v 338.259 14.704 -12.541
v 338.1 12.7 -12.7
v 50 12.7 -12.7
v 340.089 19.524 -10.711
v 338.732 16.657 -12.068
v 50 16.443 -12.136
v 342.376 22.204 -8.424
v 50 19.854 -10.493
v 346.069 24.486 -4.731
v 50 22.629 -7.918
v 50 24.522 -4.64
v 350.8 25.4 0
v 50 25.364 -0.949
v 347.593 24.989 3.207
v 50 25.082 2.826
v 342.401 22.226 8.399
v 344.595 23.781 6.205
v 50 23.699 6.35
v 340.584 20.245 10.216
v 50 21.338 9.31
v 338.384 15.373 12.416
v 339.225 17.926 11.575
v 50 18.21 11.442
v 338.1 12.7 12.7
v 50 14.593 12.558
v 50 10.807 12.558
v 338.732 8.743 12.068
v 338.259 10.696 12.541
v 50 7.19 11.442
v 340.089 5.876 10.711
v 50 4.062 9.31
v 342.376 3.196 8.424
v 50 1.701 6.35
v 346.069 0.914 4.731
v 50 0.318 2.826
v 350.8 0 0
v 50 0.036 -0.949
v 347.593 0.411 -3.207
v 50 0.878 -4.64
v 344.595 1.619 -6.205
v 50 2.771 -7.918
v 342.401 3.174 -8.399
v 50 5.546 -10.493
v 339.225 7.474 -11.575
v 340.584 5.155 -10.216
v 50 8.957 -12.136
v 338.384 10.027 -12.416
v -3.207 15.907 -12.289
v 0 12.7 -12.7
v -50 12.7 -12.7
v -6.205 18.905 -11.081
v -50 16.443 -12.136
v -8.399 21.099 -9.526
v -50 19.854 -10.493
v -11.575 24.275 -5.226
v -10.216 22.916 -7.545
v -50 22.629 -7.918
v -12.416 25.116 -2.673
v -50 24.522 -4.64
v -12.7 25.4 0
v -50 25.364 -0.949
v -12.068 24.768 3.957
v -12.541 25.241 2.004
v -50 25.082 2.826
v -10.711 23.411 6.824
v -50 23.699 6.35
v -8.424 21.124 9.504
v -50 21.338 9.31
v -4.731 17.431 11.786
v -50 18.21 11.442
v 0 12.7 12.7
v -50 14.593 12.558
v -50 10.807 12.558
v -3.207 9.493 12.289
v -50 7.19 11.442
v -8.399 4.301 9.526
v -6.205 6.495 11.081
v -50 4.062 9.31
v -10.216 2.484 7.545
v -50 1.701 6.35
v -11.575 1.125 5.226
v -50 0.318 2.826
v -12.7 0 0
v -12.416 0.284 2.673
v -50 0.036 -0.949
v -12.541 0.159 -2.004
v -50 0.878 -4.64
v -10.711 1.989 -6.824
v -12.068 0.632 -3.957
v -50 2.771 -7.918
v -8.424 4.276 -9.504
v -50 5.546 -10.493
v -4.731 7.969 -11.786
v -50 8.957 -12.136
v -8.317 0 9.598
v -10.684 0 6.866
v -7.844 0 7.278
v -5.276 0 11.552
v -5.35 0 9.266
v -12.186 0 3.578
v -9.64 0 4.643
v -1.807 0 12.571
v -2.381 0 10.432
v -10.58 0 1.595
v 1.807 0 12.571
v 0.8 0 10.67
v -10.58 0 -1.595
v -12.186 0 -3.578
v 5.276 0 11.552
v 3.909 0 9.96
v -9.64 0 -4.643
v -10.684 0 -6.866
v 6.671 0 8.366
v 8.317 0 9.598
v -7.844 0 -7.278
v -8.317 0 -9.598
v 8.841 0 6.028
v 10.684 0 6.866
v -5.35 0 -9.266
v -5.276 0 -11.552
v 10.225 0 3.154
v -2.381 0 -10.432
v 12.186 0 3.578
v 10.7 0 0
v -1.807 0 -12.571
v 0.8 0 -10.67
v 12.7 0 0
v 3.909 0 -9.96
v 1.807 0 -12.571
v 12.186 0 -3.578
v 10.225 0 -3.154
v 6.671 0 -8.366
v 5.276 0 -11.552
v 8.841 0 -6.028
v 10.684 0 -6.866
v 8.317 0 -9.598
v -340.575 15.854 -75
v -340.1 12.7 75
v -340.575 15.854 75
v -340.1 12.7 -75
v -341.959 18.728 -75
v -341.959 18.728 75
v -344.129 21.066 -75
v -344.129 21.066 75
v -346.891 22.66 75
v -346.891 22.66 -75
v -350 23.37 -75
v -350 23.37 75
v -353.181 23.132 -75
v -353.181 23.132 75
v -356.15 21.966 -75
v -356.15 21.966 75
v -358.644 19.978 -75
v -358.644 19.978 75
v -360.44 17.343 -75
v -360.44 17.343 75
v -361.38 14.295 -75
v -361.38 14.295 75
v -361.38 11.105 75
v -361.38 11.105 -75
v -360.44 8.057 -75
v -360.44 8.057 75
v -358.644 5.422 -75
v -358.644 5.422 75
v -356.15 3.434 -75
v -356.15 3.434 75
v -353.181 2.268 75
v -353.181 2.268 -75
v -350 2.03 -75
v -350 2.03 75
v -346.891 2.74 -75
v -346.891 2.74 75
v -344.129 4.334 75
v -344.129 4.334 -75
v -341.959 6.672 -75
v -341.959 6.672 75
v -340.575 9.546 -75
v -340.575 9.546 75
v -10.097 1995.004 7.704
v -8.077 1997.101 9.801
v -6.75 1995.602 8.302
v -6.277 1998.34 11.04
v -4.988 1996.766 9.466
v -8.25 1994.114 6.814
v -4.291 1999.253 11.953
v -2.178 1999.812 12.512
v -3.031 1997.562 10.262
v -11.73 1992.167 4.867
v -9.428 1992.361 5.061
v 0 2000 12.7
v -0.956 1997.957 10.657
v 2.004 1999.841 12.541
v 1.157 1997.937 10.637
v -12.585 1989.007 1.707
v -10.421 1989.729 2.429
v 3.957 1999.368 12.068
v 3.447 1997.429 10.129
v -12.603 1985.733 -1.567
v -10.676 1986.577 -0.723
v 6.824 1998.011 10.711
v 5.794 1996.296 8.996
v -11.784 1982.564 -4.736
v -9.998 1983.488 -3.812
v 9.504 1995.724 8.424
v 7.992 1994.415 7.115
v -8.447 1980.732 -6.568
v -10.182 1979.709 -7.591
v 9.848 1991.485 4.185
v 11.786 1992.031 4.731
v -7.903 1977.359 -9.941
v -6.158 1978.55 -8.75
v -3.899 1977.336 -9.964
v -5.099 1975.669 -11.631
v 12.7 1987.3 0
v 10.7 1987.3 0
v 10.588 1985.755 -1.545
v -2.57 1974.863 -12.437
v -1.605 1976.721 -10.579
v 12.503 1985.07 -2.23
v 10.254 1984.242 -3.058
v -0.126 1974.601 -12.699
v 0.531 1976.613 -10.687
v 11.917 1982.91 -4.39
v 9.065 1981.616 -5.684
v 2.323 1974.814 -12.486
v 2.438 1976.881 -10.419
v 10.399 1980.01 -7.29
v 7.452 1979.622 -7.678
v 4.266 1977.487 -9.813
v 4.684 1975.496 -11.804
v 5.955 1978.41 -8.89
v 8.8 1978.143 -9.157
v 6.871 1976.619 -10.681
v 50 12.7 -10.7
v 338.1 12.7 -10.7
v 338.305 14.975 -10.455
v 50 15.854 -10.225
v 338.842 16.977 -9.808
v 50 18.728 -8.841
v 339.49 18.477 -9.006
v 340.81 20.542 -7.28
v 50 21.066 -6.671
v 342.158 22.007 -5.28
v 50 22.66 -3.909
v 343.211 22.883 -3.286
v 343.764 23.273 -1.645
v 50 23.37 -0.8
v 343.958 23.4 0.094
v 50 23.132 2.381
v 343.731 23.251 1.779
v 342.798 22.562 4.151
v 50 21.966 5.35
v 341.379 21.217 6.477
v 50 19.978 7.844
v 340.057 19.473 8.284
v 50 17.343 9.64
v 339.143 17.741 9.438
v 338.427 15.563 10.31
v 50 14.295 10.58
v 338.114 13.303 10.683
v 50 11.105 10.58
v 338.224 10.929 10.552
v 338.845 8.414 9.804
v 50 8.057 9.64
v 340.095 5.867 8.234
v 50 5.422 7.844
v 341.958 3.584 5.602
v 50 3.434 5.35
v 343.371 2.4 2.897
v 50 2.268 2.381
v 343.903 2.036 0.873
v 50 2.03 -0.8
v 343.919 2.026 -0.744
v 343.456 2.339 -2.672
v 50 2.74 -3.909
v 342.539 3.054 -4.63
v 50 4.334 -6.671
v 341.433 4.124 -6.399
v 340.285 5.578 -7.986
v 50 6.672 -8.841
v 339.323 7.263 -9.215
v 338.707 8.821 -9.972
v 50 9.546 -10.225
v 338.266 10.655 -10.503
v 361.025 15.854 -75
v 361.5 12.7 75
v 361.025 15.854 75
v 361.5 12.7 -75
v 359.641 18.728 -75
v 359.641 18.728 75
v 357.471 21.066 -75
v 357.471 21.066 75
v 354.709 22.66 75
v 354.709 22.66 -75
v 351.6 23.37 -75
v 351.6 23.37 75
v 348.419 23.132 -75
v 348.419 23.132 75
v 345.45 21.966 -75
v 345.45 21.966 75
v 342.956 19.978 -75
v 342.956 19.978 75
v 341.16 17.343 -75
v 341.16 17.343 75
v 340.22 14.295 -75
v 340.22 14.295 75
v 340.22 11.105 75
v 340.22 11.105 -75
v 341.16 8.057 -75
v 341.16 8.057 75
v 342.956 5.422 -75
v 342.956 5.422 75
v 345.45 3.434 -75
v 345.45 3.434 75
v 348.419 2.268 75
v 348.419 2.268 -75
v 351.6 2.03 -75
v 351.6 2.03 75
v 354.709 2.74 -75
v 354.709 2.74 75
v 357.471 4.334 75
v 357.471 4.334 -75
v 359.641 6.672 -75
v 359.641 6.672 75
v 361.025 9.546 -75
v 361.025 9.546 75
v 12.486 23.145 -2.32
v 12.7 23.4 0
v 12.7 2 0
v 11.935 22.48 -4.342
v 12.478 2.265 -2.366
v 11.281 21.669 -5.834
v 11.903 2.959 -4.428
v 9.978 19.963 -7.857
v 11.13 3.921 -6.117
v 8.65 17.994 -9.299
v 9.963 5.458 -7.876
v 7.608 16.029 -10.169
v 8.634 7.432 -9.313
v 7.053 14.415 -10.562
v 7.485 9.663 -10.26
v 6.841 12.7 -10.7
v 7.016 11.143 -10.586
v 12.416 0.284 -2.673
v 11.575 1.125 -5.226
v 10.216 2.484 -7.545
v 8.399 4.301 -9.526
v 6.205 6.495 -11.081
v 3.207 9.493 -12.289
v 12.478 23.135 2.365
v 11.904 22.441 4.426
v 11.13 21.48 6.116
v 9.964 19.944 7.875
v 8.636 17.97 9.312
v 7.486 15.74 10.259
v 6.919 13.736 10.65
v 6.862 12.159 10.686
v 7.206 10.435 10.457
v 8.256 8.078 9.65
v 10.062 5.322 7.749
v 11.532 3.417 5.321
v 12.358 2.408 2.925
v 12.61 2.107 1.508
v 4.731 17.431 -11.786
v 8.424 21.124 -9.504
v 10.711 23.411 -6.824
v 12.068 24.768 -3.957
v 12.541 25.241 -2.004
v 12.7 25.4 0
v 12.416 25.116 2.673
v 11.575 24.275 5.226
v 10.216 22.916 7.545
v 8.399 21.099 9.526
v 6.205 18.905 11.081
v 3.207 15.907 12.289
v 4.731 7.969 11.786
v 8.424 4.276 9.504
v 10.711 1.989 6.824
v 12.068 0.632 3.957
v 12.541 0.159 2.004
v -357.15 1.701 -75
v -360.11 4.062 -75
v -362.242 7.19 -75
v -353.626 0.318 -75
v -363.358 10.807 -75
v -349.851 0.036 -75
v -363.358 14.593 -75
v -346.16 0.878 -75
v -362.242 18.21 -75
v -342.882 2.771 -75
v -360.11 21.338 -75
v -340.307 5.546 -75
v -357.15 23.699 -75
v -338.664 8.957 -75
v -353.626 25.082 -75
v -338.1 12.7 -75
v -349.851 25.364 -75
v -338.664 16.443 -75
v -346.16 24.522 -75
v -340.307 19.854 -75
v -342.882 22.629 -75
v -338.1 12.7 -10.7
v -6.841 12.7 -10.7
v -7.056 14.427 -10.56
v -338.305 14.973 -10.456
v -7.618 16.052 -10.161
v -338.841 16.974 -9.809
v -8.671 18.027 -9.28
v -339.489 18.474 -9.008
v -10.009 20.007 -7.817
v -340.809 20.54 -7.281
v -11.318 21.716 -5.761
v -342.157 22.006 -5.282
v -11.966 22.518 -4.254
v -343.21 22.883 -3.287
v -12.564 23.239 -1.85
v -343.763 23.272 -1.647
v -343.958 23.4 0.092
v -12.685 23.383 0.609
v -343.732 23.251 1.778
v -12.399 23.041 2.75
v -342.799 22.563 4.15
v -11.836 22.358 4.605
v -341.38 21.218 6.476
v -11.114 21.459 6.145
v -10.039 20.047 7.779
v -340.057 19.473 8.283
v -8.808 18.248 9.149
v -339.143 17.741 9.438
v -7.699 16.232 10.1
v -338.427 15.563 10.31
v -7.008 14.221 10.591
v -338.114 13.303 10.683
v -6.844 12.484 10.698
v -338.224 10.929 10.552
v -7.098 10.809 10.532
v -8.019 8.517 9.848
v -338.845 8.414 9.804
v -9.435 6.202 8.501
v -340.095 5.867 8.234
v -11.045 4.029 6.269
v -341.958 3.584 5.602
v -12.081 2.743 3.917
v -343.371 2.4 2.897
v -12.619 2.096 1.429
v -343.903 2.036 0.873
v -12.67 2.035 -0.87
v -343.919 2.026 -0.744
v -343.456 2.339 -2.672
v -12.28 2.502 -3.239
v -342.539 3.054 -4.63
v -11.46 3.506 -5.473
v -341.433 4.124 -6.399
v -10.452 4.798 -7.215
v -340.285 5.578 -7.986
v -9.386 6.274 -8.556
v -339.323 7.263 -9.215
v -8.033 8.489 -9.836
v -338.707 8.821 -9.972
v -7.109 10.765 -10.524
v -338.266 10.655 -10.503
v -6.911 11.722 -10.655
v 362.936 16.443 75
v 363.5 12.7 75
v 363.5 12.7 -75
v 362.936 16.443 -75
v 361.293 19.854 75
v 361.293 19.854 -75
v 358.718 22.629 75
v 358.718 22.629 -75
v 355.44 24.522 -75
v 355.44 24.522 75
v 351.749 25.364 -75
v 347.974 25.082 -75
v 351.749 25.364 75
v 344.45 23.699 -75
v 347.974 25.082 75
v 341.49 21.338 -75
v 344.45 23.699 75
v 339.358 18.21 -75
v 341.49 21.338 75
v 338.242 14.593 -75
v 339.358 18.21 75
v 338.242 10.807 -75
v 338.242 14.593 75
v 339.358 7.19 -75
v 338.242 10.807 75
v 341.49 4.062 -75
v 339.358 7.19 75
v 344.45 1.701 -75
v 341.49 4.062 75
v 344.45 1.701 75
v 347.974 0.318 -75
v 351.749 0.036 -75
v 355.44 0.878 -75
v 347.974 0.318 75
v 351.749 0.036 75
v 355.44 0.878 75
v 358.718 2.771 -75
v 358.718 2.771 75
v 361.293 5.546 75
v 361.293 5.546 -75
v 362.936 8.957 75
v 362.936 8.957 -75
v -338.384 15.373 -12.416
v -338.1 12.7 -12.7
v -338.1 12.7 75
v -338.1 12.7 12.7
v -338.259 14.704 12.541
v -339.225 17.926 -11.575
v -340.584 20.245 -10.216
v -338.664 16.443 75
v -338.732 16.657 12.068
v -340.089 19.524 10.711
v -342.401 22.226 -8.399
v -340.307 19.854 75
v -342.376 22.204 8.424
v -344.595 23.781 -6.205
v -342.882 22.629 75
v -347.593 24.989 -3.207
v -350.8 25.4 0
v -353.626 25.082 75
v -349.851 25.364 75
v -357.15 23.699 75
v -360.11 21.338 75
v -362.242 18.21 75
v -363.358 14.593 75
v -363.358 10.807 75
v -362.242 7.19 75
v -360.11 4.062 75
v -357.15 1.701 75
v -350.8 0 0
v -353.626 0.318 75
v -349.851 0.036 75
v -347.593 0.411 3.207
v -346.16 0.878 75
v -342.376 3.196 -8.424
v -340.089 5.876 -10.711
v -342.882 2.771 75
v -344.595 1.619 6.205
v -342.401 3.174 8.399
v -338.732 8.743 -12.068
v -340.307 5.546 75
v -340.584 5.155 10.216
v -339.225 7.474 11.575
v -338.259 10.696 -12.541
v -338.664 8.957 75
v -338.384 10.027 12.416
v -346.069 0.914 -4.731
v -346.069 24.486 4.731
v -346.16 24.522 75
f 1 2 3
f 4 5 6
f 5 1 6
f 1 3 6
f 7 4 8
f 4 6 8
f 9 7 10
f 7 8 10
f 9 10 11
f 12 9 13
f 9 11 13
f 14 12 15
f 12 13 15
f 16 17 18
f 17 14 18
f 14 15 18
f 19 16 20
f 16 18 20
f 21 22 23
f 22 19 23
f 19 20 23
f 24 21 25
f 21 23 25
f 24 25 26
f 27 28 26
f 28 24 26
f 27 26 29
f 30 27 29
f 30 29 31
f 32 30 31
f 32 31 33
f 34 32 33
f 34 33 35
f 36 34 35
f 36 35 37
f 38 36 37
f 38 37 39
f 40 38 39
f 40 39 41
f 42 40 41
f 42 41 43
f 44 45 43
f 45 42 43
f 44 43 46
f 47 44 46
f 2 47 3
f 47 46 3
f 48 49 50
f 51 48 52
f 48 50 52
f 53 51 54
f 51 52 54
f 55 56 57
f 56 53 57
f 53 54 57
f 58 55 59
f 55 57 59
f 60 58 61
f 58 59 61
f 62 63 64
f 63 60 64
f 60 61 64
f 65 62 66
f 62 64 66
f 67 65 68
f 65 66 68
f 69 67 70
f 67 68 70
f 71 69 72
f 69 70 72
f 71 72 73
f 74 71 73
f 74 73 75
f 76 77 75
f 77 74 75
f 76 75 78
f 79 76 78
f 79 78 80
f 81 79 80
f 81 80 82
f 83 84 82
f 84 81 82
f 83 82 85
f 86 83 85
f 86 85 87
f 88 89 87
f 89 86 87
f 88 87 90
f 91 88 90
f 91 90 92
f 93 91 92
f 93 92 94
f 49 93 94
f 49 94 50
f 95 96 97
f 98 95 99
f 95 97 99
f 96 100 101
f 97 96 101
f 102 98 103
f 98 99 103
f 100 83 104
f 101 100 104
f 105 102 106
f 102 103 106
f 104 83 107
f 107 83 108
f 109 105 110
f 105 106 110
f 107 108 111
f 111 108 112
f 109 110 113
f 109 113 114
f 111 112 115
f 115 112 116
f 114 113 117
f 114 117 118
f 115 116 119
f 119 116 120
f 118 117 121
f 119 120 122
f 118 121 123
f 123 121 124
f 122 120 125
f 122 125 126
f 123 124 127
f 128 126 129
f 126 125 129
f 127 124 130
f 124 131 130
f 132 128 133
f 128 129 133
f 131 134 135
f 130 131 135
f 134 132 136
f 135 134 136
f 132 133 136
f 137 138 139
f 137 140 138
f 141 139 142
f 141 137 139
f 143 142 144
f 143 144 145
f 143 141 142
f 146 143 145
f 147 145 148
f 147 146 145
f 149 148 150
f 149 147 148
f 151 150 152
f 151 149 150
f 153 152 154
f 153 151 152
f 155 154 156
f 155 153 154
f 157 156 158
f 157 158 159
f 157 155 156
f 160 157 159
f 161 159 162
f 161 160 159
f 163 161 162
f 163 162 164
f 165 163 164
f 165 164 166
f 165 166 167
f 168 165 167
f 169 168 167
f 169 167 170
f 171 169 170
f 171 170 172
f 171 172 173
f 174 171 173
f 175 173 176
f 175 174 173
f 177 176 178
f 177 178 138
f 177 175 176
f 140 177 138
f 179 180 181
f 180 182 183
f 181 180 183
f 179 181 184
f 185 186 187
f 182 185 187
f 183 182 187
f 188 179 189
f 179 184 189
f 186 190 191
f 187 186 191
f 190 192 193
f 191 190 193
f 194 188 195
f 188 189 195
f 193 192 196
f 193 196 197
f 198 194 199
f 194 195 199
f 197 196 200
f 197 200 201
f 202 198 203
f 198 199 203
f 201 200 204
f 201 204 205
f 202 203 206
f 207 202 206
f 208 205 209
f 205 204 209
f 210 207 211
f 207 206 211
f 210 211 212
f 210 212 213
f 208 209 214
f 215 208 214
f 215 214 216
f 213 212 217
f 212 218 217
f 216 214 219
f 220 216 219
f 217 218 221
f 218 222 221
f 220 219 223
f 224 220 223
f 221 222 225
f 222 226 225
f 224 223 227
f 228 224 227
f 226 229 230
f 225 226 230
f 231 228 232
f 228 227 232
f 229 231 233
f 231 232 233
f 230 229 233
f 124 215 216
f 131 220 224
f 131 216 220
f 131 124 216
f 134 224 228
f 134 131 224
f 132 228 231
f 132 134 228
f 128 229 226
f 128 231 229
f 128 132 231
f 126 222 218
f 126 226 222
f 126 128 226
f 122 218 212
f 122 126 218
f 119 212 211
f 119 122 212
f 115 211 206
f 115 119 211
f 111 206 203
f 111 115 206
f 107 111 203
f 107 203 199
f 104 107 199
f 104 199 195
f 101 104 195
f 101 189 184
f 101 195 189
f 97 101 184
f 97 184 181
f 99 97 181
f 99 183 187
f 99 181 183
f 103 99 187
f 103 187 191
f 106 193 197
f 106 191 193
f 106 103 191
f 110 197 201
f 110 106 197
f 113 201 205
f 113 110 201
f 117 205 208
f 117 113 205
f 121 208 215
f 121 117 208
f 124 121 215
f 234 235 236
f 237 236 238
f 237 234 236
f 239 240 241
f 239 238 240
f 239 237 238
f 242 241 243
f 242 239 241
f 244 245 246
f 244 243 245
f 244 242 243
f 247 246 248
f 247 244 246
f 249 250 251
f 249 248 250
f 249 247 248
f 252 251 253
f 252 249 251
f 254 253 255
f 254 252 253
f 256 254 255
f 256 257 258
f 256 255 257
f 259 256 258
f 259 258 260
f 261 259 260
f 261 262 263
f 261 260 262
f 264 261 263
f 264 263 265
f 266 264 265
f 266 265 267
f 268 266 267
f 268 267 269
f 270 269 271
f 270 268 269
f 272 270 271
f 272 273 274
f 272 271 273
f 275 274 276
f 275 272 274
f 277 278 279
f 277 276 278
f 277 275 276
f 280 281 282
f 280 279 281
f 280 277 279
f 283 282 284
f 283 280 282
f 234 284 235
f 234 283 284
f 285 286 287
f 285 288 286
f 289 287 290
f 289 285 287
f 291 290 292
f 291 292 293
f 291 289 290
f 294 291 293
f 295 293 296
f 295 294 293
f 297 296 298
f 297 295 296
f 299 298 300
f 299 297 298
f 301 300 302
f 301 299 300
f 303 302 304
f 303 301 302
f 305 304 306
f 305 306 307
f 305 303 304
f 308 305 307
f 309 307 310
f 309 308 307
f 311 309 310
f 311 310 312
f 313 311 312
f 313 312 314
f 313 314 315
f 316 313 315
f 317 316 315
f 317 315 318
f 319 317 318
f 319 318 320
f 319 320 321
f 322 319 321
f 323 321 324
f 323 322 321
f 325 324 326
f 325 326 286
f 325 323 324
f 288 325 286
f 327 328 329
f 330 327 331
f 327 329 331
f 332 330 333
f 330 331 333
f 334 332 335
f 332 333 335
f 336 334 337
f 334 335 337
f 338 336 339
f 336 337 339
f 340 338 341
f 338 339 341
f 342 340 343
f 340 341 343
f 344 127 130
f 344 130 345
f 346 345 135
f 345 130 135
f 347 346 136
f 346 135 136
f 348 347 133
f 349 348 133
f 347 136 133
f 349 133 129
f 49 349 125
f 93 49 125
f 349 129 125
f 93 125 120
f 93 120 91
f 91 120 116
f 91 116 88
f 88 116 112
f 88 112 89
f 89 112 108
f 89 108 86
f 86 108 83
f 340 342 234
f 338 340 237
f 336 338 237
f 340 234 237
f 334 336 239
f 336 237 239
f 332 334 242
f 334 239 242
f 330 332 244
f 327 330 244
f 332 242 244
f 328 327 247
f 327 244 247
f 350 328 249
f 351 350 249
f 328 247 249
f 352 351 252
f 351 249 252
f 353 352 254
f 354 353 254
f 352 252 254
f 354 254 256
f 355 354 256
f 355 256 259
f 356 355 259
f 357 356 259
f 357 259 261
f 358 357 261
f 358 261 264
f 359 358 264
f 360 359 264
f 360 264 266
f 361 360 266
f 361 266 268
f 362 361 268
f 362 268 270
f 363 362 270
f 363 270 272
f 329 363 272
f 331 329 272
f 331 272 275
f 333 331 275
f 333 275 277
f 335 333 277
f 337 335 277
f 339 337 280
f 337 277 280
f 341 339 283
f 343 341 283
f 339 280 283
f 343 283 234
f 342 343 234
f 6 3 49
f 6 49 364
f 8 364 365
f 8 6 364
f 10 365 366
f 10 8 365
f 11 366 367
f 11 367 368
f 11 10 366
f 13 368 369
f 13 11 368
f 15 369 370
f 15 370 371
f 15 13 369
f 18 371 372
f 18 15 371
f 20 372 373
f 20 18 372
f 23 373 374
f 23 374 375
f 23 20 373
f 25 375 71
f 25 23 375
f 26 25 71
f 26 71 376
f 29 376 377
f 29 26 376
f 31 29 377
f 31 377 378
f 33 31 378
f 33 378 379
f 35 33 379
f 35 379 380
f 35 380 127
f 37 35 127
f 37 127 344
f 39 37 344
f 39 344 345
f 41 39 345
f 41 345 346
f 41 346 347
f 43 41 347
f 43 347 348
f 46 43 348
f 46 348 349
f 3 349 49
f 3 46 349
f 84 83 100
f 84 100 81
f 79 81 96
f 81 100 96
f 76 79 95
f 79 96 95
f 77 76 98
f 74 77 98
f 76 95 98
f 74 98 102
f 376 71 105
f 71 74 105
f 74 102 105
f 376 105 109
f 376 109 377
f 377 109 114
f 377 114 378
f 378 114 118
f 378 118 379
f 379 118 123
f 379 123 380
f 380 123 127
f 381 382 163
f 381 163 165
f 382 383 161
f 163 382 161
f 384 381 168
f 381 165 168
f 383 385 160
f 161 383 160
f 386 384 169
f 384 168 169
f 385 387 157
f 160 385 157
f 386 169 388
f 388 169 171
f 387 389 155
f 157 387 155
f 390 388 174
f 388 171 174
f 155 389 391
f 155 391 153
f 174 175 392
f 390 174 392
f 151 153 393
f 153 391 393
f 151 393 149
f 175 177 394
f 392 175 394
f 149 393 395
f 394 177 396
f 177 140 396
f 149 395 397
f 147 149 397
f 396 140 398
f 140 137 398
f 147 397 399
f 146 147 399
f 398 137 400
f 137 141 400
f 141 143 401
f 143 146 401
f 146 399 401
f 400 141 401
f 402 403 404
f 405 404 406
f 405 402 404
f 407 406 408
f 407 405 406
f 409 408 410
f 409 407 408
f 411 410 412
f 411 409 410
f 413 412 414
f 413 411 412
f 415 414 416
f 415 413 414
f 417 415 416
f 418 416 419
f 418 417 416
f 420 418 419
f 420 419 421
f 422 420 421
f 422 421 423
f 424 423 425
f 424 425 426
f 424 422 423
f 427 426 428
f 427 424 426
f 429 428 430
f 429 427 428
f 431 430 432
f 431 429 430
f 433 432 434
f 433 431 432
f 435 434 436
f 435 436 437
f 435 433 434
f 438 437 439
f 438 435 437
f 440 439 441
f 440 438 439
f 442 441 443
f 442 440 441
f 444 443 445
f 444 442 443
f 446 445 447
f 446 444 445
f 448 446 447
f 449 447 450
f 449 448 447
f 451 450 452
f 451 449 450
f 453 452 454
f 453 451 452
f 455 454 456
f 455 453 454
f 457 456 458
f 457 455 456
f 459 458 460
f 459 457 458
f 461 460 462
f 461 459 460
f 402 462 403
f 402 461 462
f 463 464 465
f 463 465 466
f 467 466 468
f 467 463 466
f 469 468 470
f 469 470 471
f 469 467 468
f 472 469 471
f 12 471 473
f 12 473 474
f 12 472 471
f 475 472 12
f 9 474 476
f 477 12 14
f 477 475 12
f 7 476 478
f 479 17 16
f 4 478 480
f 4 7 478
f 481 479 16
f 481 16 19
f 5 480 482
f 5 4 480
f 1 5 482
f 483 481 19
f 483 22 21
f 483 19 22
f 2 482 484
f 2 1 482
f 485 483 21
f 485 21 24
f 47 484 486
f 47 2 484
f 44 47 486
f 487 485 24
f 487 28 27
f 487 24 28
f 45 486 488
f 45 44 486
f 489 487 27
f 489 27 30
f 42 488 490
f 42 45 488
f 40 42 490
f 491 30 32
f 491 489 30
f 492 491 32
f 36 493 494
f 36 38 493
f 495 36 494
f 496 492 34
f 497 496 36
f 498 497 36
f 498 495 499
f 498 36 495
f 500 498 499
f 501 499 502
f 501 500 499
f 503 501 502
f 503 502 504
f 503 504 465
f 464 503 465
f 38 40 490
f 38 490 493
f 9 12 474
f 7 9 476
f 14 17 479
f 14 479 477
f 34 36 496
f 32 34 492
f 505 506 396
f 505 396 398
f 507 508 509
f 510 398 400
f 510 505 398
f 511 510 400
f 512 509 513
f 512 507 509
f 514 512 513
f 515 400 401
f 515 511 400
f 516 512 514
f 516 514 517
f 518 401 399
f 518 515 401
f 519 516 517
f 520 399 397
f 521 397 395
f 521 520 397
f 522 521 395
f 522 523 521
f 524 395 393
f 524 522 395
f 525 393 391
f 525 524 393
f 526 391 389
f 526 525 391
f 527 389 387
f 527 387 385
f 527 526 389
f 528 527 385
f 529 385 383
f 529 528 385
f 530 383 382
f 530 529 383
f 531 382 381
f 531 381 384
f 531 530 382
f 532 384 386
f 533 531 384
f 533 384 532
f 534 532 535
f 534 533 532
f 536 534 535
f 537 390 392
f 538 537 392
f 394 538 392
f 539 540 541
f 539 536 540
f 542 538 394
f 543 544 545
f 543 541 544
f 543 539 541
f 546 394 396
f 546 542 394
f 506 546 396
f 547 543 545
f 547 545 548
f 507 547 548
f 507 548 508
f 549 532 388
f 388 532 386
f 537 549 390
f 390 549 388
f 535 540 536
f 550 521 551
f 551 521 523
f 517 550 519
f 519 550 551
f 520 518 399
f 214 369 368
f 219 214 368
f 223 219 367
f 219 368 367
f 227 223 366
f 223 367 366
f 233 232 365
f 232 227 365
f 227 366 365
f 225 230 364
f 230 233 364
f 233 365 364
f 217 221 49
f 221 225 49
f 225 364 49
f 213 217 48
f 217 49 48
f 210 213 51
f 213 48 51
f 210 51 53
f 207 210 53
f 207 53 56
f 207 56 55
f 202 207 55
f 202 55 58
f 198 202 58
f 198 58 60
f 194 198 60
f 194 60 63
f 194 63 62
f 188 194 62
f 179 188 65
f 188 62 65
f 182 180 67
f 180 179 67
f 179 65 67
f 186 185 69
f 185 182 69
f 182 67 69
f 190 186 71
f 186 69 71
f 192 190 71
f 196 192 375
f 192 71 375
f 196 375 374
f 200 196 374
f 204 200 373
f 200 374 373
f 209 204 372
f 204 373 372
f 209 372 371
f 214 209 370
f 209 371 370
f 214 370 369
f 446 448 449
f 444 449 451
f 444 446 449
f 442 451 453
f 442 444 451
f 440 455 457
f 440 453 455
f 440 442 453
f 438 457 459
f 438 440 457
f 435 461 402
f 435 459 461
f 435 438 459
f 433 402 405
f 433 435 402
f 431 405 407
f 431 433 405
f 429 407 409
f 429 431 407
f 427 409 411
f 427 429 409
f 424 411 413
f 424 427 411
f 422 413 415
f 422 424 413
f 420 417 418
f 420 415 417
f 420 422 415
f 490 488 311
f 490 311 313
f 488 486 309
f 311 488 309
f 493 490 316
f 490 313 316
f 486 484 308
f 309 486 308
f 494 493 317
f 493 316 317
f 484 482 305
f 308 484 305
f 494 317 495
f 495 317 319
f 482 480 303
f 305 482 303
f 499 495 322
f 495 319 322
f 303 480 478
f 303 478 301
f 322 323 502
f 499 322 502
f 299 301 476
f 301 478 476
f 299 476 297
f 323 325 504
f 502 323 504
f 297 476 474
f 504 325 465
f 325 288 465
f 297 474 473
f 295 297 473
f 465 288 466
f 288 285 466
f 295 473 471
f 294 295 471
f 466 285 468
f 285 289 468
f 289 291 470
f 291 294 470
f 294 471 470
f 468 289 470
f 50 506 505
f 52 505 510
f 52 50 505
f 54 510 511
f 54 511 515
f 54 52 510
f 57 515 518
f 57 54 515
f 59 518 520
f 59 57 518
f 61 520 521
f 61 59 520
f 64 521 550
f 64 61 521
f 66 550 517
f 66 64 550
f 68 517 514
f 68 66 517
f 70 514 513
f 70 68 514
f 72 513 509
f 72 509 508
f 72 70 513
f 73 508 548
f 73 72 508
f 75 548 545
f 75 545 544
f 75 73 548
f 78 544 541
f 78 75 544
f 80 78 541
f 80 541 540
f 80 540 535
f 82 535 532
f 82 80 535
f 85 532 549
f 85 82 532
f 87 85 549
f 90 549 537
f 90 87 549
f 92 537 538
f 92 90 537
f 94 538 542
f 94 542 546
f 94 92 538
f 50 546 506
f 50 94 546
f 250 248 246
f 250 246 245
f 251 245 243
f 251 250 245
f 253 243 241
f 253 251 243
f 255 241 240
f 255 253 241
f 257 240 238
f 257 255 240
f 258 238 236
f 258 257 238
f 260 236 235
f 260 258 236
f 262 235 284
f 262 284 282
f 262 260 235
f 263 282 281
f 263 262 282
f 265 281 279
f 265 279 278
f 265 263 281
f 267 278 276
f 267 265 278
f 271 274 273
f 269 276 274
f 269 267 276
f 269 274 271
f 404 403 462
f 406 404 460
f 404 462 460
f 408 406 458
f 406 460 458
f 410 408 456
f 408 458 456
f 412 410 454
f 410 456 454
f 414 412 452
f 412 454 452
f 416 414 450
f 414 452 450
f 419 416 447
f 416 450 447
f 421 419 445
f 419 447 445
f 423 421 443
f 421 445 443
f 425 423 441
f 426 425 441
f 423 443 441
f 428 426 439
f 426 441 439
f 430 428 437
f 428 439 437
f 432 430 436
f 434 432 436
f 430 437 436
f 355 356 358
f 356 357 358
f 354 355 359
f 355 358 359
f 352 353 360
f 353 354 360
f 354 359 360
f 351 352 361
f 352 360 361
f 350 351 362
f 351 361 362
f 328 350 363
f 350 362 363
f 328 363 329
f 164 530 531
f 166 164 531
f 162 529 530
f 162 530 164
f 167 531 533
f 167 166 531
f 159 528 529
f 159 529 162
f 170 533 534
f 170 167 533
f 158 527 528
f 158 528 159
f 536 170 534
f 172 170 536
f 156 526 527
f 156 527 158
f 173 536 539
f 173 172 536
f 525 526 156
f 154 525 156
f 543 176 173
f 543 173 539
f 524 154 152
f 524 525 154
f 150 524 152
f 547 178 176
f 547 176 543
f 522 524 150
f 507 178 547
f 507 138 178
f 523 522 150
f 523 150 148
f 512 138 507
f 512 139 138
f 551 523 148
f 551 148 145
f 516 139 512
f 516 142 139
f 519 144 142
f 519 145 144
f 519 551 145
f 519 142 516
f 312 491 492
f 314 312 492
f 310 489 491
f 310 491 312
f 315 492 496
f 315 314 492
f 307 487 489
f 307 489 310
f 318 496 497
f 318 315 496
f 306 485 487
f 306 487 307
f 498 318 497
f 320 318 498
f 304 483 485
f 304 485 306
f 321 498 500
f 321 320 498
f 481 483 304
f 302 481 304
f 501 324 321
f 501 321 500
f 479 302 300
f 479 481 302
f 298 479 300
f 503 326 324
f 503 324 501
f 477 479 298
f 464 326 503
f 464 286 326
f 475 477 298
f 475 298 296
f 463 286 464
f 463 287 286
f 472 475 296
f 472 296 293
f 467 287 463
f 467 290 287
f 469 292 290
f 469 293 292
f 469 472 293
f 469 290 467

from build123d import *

# Parameters (mm, degrees)
SKETCH1_R                            = 12.7
SKETCH1_R_2                          = 10.7
EXTRUDE_THIN1_DEPTH                  = 2000
SKETCH6_R                            = 12.7
SKETCH6_R_2                          = 10.7
EXTRUDE_THIN4_DEPTH                  = 75
EXTRUDE_THIN5_REACH                  = 2086.148
EXTRUDE_THIN5_END_RADIUS             = 12.7
EXTRUDE_THIN5_START                  = 50
SKETCH7_R                            = 12.7
SKETCH7_R_2                          = 10.7
EXTRUDE_THIN5_DIRECTION_2_REACH      = 2086.148
EXTRUDE_THIN5_DIRECTION_2_END_RADIUS = 12.7
SKETCH8_R                            = 12.7
SKETCH8_R_2                          = 10.7
EXTRUDE_THIN6_DEPTH                  = 75
EXTRUDE_THIN8_REACH                  = 2086.148
EXTRUDE_THIN8_END_RADIUS             = 12.7
EXTRUDE_THIN8_START                  = -50
SKETCH9_R                            = 12.7
SKETCH9_R_2                          = 10.7
EXTRUDE_THIN8_DIRECTION_2_REACH      = 2086.148
EXTRUDE_THIN8_DIRECTION_2_END_RADIUS = 12.7


with BuildPart() as part:
    # Sketch1 → Extrude-Thin1 (new body)
    with BuildSketch(Plane(origin=(0, 0, 0), x_dir=(1, 0, 0), z_dir=(0, 1, 0))):
        Circle(SKETCH1_R)
        Circle(SKETCH1_R_2, mode=Mode.SUBTRACT)
    extrude(amount=EXTRUDE_THIN1_DEPTH)



with BuildPart() as body_2:
    # Sketch6 → Extrude-Thin4 (new, symmetric)
    with BuildSketch(Plane.XY):
        with Locations((350.8, 12.7)):
            Circle(SKETCH6_R)
        with Locations((350.8, 12.7)):
            Circle(SKETCH6_R_2, mode=Mode.SUBTRACT)
    extrude(amount=EXTRUDE_THIN4_DEPTH, both=True)


with BuildPart() as part_1:
    add(part.part)

    add(body_2.part)  # Extrude-Thin5 merges body 2
    # Extrude-Thin5: up to this cylinder (the profile starts outside it)
    extrude_thin5_end = Plane(origin=(350.8, 12.7, 12.34079), z_dir=(0, 0, -1)) * Cylinder(EXTRUDE_THIN5_END_RADIUS, 4198.696, mode=Mode.PRIVATE)
    # Sketch7 → Extrude-Thin5 (add, up to the surface)
    with BuildSketch(Plane(origin=(0, 0, 0), x_dir=(0, 0, -1), z_dir=(1, 0, 0)).offset(EXTRUDE_THIN5_START), mode=Mode.PRIVATE) as extrude_thin5_sk1:
        with Locations((0, 12.7)):
            Circle(SKETCH7_R)
        with Locations((0, 12.7)):
            Circle(SKETCH7_R_2, mode=Mode.SUBTRACT)
    extrude_thin5_tool1 = extrude(extrude_thin5_sk1.sketch, amount=EXTRUDE_THIN5_REACH, mode=Mode.PRIVATE) - extrude_thin5_end
    add(extrude_thin5_tool1.solids().sort_by_distance((50, 12.7, 12.34079))[0])

    # Extrude-Thin5 direction 2: up to this cylinder (the profile starts outside it)
    extrude_thin5_direction_2_end = Plane(origin=(0, 12.7, 0), z_dir=(0, -1, 0)) * Cylinder(EXTRUDE_THIN5_DIRECTION_2_END_RADIUS, 4198.696, mode=Mode.PRIVATE)
    # Sketch7 → Extrude-Thin5 direction 2 (add, up to the surface)
    with BuildSketch(Plane(origin=(0, 0, 0), x_dir=(0, 0, -1), z_dir=(1, 0, 0)).offset(EXTRUDE_THIN5_START), mode=Mode.PRIVATE) as extrude_thin5_direction_2_sk1:
        with Locations((0, 12.7)):
            Circle(SKETCH7_R)
        with Locations((0, 12.7)):
            Circle(SKETCH7_R_2, mode=Mode.SUBTRACT)
    extrude_thin5_direction_2_tool1 = extrude(extrude_thin5_direction_2_sk1.sketch, amount=-EXTRUDE_THIN5_DIRECTION_2_REACH, mode=Mode.PRIVATE) - extrude_thin5_direction_2_end
    add(extrude_thin5_direction_2_tool1.solids().sort_by_distance((50, 12.7, 12.34079))[0])



with BuildPart() as body_2_2:
    # Sketch8 → Extrude-Thin6 (new, symmetric)
    with BuildSketch(Plane.XY):
        with Locations((-350.8, 12.7)):
            Circle(SKETCH8_R)
        with Locations((-350.8, 12.7)):
            Circle(SKETCH8_R_2, mode=Mode.SUBTRACT)
    extrude(amount=EXTRUDE_THIN6_DEPTH, both=True)


with BuildPart() as part_2:
    add(part_1.part)

    add(body_2_2.part)  # Extrude-Thin8 merges body 2 2
    # Extrude-Thin8: up to this cylinder (the profile starts outside it)
    extrude_thin8_end = Plane(origin=(-350.8, 12.7, 12.34079), z_dir=(0, 0, -1)) * Cylinder(EXTRUDE_THIN8_END_RADIUS, 4198.696, mode=Mode.PRIVATE)
    # Sketch9 → Extrude-Thin8 (add, up to the surface)
    with BuildSketch(Plane(origin=(0, 0, 0), x_dir=(0, 0, -1), z_dir=(1, 0, 0)).offset(EXTRUDE_THIN8_START), mode=Mode.PRIVATE) as extrude_thin8_sk1:
        with Locations((0, 12.7)):
            Circle(SKETCH9_R)
        with Locations((0, 12.7)):
            Circle(SKETCH9_R_2, mode=Mode.SUBTRACT)
    extrude_thin8_tool1 = extrude(extrude_thin8_sk1.sketch, amount=-EXTRUDE_THIN8_REACH, mode=Mode.PRIVATE) - extrude_thin8_end
    add(extrude_thin8_tool1.solids().sort_by_distance((-50, 12.7, 12.34079))[0])

    # Extrude-Thin8 direction 2: up to this cylinder (the profile starts outside it)
    extrude_thin8_direction_2_end = Plane(origin=(0, 12.7, 0), z_dir=(0, -1, 0)) * Cylinder(EXTRUDE_THIN8_DIRECTION_2_END_RADIUS, 4198.696, mode=Mode.PRIVATE)
    # Sketch9 → Extrude-Thin8 direction 2 (add, up to the surface)
    with BuildSketch(Plane(origin=(0, 0, 0), x_dir=(0, 0, -1), z_dir=(1, 0, 0)).offset(EXTRUDE_THIN8_START), mode=Mode.PRIVATE) as extrude_thin8_direction_2_sk1:
        with Locations((0, 12.7)):
            Circle(SKETCH9_R)
        with Locations((0, 12.7)):
            Circle(SKETCH9_R_2, mode=Mode.SUBTRACT)
    extrude_thin8_direction_2_tool1 = extrude(extrude_thin8_direction_2_sk1.sketch, amount=EXTRUDE_THIN8_DIRECTION_2_REACH, mode=Mode.PRIVATE) - extrude_thin8_direction_2_end
    add(extrude_thin8_direction_2_tool1.solids().sort_by_distance((-50, 12.7, 12.34079))[0])

    # SurfaceCut1
    split(bisect_by=Plane(origin=(0, 993.65, -993.65), x_dir=(0, -0.7071067811865457, -0.7071067811865493), z_dir=(0, -0.7071067811865493, 0.7071067811865457)), keep=Keep.TOP)


solid = part_2.part
